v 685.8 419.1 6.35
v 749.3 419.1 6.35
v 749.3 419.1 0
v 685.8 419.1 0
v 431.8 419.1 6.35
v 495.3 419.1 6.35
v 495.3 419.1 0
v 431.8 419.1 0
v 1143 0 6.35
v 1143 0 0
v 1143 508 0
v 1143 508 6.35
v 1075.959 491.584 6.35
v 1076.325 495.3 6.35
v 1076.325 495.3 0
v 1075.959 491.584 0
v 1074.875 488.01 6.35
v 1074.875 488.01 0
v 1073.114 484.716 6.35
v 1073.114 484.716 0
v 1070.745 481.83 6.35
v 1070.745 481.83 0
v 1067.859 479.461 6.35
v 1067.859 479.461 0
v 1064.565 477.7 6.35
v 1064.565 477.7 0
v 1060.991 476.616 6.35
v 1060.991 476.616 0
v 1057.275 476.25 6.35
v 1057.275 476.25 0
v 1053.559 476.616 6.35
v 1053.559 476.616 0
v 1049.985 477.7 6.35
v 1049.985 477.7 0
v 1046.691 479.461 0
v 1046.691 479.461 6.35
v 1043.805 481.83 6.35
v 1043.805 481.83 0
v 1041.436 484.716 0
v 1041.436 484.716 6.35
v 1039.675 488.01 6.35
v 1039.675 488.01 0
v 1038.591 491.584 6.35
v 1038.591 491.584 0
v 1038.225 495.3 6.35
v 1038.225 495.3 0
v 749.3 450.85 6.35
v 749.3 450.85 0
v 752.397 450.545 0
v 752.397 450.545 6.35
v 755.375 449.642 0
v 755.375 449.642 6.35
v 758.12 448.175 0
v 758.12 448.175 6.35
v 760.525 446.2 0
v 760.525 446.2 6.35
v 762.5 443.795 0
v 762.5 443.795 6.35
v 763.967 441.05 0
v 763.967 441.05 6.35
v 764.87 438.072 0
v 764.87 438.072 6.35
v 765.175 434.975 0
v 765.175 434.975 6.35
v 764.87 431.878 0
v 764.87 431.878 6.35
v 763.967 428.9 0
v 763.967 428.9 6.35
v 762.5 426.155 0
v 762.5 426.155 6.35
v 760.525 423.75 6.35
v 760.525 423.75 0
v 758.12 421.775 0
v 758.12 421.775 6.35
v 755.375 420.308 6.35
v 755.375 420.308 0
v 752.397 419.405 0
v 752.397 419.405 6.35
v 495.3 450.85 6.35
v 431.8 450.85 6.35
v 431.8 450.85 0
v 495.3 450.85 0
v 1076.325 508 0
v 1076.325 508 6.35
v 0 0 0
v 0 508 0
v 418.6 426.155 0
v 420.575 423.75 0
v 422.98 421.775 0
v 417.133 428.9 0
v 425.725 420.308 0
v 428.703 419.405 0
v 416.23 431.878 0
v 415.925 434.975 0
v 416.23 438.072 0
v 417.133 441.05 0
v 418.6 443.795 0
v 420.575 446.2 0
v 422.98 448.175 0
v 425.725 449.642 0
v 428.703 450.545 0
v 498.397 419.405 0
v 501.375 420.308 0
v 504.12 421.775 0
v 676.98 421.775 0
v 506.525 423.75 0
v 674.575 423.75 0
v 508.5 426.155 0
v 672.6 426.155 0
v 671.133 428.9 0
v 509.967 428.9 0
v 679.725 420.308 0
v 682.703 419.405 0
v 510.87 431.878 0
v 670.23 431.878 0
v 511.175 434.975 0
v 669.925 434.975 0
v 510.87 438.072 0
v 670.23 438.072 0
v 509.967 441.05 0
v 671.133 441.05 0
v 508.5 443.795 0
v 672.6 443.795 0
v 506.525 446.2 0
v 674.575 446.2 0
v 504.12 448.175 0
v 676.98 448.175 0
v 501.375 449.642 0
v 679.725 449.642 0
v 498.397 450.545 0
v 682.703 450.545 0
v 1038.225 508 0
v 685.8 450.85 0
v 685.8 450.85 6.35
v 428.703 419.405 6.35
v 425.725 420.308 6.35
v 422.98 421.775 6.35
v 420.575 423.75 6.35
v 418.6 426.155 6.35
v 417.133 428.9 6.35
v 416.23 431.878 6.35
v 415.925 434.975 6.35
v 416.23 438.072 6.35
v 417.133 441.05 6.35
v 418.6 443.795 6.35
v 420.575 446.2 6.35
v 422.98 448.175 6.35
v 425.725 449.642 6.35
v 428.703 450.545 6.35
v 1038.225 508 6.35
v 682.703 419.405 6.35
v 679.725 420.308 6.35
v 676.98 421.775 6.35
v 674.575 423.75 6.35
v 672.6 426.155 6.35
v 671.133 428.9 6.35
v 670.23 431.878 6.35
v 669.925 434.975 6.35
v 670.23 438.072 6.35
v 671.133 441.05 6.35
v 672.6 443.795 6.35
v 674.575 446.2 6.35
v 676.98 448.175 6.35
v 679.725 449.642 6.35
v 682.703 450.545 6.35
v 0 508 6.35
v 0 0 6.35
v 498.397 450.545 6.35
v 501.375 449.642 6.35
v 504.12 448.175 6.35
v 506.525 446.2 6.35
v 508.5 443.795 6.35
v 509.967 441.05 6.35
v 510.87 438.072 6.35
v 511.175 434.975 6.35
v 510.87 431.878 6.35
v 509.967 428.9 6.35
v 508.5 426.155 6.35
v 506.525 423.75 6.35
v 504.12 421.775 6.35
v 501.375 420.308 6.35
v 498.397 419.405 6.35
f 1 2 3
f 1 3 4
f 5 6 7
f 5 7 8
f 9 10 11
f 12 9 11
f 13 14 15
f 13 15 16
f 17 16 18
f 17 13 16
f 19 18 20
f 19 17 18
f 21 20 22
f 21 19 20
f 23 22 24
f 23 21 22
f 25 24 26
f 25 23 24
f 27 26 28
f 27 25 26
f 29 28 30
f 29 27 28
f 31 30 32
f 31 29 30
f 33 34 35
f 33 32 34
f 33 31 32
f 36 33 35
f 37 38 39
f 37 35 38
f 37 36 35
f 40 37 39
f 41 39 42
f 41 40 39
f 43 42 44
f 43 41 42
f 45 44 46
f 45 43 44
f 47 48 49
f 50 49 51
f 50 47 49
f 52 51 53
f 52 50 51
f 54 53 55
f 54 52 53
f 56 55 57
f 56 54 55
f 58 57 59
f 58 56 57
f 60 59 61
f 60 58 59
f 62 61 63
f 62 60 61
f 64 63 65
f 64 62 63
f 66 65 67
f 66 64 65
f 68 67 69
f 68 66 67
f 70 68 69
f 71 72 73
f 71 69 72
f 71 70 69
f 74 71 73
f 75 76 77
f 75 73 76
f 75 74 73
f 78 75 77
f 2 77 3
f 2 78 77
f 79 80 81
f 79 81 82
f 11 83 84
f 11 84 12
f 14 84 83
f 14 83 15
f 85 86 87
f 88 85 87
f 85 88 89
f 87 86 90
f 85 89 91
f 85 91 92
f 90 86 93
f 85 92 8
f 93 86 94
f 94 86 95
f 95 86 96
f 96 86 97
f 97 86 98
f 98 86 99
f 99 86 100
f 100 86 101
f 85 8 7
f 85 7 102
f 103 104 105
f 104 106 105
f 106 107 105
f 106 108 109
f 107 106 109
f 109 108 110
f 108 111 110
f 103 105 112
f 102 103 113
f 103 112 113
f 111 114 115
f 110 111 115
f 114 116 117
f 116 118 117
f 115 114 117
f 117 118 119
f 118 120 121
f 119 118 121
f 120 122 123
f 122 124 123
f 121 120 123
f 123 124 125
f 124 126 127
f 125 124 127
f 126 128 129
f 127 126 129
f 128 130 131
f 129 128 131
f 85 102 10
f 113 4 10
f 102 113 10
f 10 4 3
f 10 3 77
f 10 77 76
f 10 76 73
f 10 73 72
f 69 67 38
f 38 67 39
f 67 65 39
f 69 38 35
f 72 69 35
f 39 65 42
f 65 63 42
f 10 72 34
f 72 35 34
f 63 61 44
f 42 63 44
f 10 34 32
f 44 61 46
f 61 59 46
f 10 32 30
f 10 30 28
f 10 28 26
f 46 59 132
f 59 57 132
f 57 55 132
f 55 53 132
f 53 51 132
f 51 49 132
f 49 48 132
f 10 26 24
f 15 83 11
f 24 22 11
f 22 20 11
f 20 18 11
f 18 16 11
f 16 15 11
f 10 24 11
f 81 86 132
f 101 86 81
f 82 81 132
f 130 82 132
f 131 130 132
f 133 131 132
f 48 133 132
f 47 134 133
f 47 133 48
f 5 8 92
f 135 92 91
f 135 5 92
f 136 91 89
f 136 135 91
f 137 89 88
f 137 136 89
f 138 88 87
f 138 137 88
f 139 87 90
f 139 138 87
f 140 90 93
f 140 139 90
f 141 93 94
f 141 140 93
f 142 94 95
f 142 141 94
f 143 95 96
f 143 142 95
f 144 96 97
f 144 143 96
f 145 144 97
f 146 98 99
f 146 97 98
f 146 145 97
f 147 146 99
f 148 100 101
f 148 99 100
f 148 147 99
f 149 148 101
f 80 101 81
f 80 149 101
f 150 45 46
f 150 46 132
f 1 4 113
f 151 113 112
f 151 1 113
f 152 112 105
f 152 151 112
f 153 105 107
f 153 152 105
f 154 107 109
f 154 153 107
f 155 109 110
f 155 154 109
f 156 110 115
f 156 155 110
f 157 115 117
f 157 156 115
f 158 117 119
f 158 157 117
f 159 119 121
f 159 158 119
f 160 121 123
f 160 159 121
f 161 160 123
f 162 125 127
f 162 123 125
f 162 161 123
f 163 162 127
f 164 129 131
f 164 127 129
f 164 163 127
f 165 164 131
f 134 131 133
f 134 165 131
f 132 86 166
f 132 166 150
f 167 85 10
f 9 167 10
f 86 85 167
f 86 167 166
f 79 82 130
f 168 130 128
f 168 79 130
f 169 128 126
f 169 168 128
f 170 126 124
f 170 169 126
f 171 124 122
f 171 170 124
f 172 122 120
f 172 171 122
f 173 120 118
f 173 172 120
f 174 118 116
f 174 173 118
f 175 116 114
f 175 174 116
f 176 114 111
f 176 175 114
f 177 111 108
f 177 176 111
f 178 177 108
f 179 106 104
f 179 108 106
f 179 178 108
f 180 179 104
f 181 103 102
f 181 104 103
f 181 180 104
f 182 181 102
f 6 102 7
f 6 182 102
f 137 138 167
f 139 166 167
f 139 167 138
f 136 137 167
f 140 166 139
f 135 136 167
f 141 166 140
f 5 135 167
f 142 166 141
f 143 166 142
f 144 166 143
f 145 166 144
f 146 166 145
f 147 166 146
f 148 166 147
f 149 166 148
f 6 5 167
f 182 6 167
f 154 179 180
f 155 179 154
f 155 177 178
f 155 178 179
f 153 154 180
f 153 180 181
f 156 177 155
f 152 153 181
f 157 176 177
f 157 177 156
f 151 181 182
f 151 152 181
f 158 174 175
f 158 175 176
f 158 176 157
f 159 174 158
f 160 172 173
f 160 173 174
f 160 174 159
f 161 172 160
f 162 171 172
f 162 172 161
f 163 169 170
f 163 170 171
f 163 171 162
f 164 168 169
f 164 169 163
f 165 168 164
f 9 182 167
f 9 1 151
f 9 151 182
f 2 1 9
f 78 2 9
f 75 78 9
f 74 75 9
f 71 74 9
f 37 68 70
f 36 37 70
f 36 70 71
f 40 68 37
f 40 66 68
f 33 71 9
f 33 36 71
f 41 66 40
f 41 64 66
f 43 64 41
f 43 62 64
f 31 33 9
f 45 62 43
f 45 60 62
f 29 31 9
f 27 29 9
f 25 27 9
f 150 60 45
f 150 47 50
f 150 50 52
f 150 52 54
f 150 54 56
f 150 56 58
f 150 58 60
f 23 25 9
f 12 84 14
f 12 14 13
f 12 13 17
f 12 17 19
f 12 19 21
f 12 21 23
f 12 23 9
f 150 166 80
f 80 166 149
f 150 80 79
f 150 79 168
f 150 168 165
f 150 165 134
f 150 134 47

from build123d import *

# Parameters (mm, degrees)
SKETCH1_W           = 1143
SKETCH1_H           = 508
BOSS_EXTRUDE1_DEPTH = 6.35
CUT_EXTRUDE1_DEPTH  = 7.35
CUT_EXTRUDE2_DEPTH  = 7.35


with BuildPart() as part:
    # Sketch1 → Boss-Extrude1 (new body)
    with BuildSketch(Plane.XY):
        with Locations((571.5, 254)):
            Rectangle(SKETCH1_W, SKETCH1_H)
    extrude(amount=BOSS_EXTRUDE1_DEPTH)

    # Sketch2 → Cut-Extrude1 (cut, through all)
    with BuildSketch(Plane.XY.offset(6.35)):
        with BuildLine():
            Line((431.8, 450.85), (495.3, 450.85))
            ThreePointArc((495.3, 450.85), (511.175, 434.975), (495.3, 419.1))
            Line((495.3, 419.1), (431.8, 419.1))
            ThreePointArc((431.8, 419.1), (415.925, 434.975), (431.8, 450.85))
        make_face()
        with BuildLine():
            Line((685.8, 450.85), (749.3, 450.85))
            ThreePointArc((749.3, 450.85), (765.175, 434.975), (749.3, 419.1))
            Line((749.3, 419.1), (685.8, 419.1))
            ThreePointArc((685.8, 419.1), (669.925, 434.975), (685.8, 450.85))
        make_face()
    extrude(amount=-CUT_EXTRUDE1_DEPTH, mode=Mode.SUBTRACT)

    # Sketch6 → Cut-Extrude2 (cut, through all)
    with BuildSketch(Plane.XY.offset(6.35)):
        with BuildLine():
            Line((1038.225, 508), (1076.325, 508))
            Line((1076.325, 508), (1076.325, 495.3))
            ThreePointArc((1076.325, 495.3), (1057.275, 476.25), (1038.225, 495.3))
            Line((1038.225, 495.3), (1038.225, 508))
        make_face()
    extrude(amount=-CUT_EXTRUDE2_DEPTH, mode=Mode.SUBTRACT)


solid = part.part
